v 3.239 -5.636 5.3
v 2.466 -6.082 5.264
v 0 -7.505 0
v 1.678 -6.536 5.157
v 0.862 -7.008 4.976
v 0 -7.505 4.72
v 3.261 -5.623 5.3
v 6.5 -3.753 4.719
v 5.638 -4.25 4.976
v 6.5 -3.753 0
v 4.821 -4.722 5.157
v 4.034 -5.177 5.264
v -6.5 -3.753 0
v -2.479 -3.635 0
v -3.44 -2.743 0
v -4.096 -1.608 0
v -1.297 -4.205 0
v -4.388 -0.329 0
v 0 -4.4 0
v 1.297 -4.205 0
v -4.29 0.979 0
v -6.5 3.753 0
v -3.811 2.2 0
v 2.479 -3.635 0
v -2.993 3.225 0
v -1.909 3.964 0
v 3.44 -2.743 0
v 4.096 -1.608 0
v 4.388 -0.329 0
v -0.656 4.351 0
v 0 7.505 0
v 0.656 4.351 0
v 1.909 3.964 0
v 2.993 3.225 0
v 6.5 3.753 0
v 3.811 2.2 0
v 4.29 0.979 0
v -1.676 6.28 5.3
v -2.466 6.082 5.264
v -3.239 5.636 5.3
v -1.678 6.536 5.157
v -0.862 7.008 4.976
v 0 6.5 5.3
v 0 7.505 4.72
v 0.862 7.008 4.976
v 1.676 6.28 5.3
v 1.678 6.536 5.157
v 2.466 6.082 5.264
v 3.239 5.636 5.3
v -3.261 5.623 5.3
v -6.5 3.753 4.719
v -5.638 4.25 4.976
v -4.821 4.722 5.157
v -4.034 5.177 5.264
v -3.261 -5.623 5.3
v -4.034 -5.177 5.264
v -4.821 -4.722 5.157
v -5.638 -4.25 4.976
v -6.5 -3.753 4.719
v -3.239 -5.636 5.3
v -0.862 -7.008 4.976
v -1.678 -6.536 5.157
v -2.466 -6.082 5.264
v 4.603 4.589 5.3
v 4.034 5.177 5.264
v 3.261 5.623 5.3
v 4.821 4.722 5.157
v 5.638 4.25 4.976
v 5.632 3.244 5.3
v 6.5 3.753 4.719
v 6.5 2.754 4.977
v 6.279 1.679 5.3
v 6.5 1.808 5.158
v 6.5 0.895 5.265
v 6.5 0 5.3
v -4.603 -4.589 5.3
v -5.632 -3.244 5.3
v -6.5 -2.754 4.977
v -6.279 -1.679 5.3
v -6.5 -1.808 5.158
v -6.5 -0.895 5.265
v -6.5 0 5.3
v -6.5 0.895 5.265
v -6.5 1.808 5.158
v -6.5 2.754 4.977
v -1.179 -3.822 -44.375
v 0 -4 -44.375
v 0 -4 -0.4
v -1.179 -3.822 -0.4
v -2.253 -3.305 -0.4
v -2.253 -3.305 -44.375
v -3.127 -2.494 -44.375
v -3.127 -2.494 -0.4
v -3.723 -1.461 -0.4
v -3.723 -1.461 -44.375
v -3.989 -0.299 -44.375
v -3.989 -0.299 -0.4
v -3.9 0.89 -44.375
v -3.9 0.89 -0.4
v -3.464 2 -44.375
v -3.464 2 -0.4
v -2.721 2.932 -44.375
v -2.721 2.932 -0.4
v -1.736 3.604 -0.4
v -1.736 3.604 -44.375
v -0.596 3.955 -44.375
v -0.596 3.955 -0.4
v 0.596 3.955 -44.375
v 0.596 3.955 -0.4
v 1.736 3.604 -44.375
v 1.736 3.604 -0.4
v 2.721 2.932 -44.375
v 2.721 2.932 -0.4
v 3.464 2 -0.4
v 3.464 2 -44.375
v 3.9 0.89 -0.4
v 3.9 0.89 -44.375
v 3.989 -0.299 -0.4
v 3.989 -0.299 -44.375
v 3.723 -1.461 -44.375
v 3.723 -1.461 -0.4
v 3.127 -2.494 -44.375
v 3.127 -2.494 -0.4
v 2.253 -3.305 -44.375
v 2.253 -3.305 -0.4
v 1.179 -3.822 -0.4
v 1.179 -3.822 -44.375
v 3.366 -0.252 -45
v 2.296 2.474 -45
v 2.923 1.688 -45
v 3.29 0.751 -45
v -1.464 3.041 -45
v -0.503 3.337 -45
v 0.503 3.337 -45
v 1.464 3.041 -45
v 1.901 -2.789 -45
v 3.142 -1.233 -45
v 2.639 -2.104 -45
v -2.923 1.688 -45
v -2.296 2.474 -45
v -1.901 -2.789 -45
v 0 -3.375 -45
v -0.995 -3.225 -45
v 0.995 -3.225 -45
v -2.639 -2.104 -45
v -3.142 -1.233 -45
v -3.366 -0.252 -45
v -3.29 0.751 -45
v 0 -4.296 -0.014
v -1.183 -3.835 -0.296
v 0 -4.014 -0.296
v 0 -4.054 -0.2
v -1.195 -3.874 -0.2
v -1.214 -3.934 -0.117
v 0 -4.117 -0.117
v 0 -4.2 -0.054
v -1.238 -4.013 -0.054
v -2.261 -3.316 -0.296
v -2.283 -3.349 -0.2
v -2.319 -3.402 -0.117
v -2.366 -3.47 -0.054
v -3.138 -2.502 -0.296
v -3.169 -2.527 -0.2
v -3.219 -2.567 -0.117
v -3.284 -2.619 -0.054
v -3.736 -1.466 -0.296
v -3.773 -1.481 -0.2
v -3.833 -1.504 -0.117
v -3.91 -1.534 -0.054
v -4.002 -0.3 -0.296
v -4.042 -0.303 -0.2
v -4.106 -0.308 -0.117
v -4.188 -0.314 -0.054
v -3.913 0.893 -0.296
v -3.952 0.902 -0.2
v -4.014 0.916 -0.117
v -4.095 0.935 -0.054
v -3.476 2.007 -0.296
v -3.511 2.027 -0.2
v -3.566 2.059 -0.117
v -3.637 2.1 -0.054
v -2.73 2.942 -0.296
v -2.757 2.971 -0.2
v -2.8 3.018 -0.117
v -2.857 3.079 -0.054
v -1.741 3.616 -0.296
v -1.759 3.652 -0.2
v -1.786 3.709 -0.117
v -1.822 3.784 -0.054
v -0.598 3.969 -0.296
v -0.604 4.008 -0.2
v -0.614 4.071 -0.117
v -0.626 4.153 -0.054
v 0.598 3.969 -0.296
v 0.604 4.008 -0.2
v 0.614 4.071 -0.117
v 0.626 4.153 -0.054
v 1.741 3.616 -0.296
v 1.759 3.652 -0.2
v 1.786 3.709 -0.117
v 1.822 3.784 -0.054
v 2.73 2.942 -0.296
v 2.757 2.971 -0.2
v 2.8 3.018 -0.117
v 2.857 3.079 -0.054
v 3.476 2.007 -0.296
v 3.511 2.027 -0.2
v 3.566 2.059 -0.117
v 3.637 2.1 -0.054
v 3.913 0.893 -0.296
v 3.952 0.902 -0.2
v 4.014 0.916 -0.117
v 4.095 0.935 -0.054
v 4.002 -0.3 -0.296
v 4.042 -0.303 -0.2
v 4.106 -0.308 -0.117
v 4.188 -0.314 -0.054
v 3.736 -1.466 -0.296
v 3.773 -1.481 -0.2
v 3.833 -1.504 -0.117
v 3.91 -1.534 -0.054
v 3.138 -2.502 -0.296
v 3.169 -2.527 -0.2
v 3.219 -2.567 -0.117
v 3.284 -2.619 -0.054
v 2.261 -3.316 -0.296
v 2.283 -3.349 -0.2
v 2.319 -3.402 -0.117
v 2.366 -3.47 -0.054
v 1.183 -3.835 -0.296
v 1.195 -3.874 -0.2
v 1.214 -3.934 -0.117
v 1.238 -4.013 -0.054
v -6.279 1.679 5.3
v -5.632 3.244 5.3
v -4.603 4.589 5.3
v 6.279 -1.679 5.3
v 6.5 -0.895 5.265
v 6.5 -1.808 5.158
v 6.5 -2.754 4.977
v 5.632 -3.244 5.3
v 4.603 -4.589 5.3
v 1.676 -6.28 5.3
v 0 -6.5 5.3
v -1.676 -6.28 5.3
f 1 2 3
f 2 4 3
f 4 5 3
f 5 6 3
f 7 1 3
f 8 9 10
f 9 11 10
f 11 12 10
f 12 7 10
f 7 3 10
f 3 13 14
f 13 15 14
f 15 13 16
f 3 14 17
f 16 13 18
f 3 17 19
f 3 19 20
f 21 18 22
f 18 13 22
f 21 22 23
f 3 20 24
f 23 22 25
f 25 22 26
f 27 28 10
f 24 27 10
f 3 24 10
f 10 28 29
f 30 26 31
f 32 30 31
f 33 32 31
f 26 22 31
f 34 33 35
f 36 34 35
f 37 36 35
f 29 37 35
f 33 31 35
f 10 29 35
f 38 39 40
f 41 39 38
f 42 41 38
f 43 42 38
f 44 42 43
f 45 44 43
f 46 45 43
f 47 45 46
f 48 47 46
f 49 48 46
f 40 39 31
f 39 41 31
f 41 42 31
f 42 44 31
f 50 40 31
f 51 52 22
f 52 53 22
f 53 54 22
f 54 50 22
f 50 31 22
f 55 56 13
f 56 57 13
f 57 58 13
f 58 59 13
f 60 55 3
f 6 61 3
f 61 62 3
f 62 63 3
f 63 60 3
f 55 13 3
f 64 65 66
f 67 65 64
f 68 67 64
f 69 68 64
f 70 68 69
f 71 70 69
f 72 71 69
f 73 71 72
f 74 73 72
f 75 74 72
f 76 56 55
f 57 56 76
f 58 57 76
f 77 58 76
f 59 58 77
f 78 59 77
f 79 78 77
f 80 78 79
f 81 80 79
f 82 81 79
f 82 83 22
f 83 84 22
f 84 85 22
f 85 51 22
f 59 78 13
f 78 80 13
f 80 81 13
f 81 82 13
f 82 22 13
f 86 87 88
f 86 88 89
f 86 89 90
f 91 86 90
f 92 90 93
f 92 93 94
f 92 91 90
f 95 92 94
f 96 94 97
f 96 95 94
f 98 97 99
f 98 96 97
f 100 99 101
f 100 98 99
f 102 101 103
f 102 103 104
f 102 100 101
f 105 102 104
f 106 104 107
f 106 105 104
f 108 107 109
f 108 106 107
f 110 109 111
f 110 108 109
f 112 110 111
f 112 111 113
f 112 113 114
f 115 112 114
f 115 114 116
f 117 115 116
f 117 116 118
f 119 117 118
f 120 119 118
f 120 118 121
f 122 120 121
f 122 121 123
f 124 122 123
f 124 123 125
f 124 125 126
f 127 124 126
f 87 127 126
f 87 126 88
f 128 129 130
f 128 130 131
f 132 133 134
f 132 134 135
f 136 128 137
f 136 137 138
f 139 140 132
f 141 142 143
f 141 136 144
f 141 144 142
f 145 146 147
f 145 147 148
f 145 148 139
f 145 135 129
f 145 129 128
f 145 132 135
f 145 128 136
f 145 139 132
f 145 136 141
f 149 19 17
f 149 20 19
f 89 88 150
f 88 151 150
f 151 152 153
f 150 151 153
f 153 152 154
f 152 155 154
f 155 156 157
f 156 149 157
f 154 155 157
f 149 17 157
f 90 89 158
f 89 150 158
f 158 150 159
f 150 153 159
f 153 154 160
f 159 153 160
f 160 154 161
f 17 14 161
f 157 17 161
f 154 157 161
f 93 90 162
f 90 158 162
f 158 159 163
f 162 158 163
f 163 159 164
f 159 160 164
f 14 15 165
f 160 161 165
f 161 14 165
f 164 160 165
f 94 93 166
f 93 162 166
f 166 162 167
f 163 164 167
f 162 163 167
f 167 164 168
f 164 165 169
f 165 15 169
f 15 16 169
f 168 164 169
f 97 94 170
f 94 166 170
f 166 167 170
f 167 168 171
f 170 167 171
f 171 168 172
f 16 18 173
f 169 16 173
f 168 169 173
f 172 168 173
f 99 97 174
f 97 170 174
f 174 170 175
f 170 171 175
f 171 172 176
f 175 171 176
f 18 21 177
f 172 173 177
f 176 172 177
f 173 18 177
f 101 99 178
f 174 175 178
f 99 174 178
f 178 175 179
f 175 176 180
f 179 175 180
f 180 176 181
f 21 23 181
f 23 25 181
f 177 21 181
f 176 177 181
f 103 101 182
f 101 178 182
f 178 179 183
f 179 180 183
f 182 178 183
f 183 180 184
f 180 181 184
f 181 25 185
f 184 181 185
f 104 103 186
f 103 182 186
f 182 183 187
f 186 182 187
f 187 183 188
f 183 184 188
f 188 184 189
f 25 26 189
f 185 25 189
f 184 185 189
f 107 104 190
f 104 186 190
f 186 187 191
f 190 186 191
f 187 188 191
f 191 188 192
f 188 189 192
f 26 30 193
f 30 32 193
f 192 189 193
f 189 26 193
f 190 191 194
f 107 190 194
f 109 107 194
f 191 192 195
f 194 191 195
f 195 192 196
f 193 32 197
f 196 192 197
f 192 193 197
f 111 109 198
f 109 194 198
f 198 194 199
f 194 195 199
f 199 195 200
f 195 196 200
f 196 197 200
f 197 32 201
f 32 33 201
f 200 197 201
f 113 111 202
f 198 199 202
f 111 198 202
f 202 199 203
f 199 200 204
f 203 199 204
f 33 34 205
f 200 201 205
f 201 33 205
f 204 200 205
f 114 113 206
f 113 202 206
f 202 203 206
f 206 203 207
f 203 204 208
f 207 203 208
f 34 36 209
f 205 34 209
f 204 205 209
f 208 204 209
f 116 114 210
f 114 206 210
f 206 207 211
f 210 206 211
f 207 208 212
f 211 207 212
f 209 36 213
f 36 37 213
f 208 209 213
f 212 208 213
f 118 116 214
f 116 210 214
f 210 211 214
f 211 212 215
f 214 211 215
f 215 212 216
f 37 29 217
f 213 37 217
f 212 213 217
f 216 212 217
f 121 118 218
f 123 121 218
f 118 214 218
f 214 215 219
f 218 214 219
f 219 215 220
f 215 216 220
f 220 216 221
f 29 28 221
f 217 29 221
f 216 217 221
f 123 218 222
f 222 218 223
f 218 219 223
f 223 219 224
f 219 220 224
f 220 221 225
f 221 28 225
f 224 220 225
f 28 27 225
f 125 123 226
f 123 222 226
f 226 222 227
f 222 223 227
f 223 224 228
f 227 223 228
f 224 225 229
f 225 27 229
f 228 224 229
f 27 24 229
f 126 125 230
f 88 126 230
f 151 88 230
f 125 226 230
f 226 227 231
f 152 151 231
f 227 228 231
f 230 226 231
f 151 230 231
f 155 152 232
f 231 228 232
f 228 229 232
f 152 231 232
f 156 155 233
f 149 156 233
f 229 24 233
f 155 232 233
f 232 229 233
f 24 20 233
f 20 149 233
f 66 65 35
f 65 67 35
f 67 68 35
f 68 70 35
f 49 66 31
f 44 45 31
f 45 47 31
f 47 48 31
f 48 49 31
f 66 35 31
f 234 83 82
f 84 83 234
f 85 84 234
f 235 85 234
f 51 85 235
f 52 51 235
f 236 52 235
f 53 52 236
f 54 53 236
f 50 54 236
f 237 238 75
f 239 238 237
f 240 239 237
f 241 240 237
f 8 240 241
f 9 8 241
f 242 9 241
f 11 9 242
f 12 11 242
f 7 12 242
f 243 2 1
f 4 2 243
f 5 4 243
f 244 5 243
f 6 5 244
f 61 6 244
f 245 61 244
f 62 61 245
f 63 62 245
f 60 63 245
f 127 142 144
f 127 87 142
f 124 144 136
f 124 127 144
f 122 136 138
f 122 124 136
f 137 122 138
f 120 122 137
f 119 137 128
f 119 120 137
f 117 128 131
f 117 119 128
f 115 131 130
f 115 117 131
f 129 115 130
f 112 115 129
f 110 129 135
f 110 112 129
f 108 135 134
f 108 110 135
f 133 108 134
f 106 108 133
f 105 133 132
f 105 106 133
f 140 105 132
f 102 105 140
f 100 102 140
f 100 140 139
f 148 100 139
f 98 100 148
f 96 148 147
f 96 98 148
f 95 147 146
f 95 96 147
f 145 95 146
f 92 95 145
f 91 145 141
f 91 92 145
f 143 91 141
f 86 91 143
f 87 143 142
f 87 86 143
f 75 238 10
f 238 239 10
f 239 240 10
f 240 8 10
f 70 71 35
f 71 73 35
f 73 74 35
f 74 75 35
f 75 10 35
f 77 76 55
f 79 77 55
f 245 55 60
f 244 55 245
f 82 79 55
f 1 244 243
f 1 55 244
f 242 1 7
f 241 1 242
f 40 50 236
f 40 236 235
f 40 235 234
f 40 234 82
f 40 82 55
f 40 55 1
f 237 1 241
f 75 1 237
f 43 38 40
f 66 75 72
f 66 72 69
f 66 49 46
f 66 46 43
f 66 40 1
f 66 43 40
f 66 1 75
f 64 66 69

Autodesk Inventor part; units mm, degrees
ref_plane "WorkPlane1" through (0, 0, 0) normal (0, 0, 1) x (1, 0, 0)
sketch "Sketch1" plane through (0, 0, 0) normal (0, 0, 1) x (1, 0, 0)
  point P0 (0, 0)
sketch "Sketch2" plane through (0, 0, 0) normal (0, 0, 1) x (1, 0, 0)
  line L0 (-6.5, 3.7529) -> (-6.5, -3.7529)
  line L1 (0, 7.5054) -> (-6.5, 3.7529)
  line L2 (6.5, 3.7529) -> (0, 7.5054)
  line L3 (6.5, -3.7529) -> (6.5, 3.7529)
  line L4 (0, -7.5054) -> (6.5, -3.7529)
  line L5 (-6.5, -3.7529) -> (0, -7.5054)
  circle A0 centre (0, 0) radius 6.5 construction
  dimension "d1" = 13
  dimension "d29" = 0
  dimension "d30" = 0
extrude "Extrusion1" add sketch "Sketch2" along normal blind 5.3
sketch "Sketch3" plane through (0, 0, 0) normal (1, 0, 0) x (0, 1, 0)
  line L0 (6.5, 5.3) -> (7.6054, 5.3)
  line L1 (7.6054, 4.6618) -> (6.5, 5.3)
  line L2 (7.6054, 5.3) -> (7.6054, 4.6618)
  line L3 (0, -1.06) -> (0, 6.36) projected
  line L4 (7.5054, 0) -> (7.5054, 5.3) projected
  dimension "d25" = 0.1
  dimension "d26" = 0
  dimension "d27" = 60
  dimension "d28" = 6.5
revolve "Revolution1" cut sketch "Sketch3" angle 360 about axis through (0, 0, -10) along (0, 0, 1)
sketch "Sketch4" plane through (0, 0, 0) normal (1, 0, 0) x (0, 1, 0)
  line L0 (0, -45) -> (0, 0)
  line L1 (-4, -45) -> (0, -45)
  line L2 (-4, 0) -> (-4, -45)
  line L3 (0, 0) -> (-4, 0)
  line L4 (0, -45) -> (0, 0)
  line L5 (-4.8, 0) -> (0.8, 0) projected
  line L6 (0, -54) -> (0, 9) projected
  dimension "d18" = 4
  dimension "d20" = 45
  dimension "d33" = 0
  dimension "d34" = 0
revolve "Revolution2" add sketch "Sketch4" angle 360 about axis through (0, 0, -45) along (0, 0, -1)
chamfer "Chamfer1" distance 0.625 angle 45 1 edges at (0, 4, -45)
fillet "Fillet1" radius 0.4 1 edges at (0, 4, 0)
thread "Thread1" size "M8x1.25" class "6g" standard "ISO Metric profile" length 42.5
ref_plane "MSC_PF1" through (0, 0, 0) normal (1, 0, 0) x (0, 1, 0)
ref_plane "MSC_PT1" through (0, 0, 0) normal (0, 0, -1) x (-1, 0, 0)
equation "\"d22\" = 0.5 * PTC"
equation "\"d23\" = 0.5 * PTC"
equation "\"d24\" = r"
equation "\"d1\" = ParS"
equation "\"d6\" = ParK"
equation "\"b\" = NLG - 2 * PTC"
equation "\"d28\" = 0.5 * ParS"
equation "\"d18\" = 0.5 * NND"
equation "\"d20\" = NLG"
equation "\"NND\" = 8"
equation "\"NLG\" = 45"
equation "\"PTC\" = 1.25"
equation "\"ParK\" = 5.3"
equation "\"ParS\" = 13"
equation "\"msp_es\" = 0.577367 * ParS"
equation "\"r\" = 0.4"
equation "\"THREADDIA\" = NND"
properties part number "ISO 4018 - M8 x 45" material "Steel"
